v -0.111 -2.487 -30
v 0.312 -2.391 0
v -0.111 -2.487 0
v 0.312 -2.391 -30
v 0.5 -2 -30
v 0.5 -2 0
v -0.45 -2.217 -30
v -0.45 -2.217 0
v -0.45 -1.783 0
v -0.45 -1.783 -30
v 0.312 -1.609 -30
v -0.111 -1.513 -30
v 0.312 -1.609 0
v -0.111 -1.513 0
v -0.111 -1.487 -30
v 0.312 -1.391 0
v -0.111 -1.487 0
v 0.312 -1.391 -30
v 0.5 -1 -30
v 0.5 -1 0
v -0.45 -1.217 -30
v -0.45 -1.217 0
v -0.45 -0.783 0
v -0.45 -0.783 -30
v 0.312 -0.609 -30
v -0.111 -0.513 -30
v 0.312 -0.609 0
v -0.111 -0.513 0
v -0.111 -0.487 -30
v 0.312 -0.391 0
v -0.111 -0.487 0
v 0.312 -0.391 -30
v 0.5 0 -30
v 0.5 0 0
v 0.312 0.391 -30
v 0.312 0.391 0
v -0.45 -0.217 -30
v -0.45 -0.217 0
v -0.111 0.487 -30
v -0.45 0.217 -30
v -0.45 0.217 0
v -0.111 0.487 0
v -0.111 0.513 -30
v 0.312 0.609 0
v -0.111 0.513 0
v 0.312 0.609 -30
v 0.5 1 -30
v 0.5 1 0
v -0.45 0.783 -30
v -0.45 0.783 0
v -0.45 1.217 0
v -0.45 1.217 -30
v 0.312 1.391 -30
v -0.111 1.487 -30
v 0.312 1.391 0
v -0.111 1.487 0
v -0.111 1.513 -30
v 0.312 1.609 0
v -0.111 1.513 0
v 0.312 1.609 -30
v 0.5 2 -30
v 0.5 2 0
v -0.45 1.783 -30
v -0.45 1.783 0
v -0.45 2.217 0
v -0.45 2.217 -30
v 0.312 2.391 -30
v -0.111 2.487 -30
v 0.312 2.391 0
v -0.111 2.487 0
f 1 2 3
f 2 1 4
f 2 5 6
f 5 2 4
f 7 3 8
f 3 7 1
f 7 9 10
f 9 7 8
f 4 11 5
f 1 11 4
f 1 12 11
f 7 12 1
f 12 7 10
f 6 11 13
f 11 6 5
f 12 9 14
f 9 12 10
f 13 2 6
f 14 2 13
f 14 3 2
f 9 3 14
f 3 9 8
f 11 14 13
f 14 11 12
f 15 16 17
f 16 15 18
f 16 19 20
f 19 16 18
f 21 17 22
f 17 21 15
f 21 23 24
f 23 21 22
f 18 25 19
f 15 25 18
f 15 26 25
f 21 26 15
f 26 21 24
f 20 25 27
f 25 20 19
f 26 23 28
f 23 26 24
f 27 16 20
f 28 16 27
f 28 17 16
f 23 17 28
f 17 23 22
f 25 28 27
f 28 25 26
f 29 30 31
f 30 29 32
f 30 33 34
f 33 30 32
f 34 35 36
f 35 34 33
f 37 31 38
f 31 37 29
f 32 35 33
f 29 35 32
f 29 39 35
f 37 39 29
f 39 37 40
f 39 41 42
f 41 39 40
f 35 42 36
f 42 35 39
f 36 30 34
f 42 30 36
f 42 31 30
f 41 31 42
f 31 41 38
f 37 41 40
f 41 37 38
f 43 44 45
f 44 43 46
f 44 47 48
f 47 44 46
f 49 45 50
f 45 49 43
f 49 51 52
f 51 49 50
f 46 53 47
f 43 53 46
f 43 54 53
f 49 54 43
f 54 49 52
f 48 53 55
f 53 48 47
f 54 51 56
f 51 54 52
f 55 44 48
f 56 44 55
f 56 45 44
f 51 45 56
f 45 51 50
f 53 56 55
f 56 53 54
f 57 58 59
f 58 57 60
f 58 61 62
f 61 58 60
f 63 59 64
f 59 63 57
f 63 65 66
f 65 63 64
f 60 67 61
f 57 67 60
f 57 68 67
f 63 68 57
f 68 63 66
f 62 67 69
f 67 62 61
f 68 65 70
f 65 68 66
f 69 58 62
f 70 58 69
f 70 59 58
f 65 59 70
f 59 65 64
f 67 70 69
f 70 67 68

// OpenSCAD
// 28BYJ-48 from RGriffoGoes 
// at http://www.thingiverse.com/thing:204734
// named and measured dimensions, and
// added details by J.Beale 21 July 2014

MBH = 18.8;   // motor body height
MBD = 28.25;  // motor body OD
SBD = 9.1;    // shaft boss OD
SBH = 1.45;   // shaft boss height above motor body
SBO = 7.875;  // offset of shaft/boss center from motor center
SHD = 4.93;   // motor shaft OD
SHDF = 3.0;   // motor shaft diameter, across flats
SHHF = 6.0;   // motor shaft flats height, or depth in from end
SHH = 9.75;   // height of shaft above motor body 

MBFH = 0.7;   // height of body edge flange protruding above surface
MBFW = 1.0;   // width of edge flange
MBFNW = 8;    // width of notch in edge flange
MBFNW2 = 17.8;  // width of edge flange notch above wiring box

MHCC = 35.0;  // mounting hole center-to-center
MTH  = 0.8;   // mounting tab thickness
MTW  = 7.0;   // mounting tab width
WBH  = 16.7;  // plastic wiring box height
WBW  = 14.6;  // plastic wiring box width
WBD  = 31.3;  // body diameter to outer surface of wiring box

WRD = 1.0;     // diameter of electrical wires
WRL = 30;      // length of electrical wires
WRO = 2.2;		// offset of wires below top motor surface

// =========================================================
eps = 0.05;   // small number to avoid coincident faces


module wires() {
 
  color([0.9,0.9,0]) translate([0,WRD*2,0]) cylinder(h=WRL,r=WRD/2, $fn = 7);
  color([.9,.45,0]) translate([0,WRD*1,0]) cylinder(h=WRL,r=WRD/2, $fn = 7);   
  color([1,0,0]) translate([0,0,0]) cylinder(h=WRL,r=WRD/2, $fn = 7);
  color([1,.6,.6]) translate([0,-WRD*1,0]) cylinder(h=WRL,r=WRD/2, $fn = 7);
  color([.2,.2,1]) translate([0,-WRD*2,0]) cylinder(h=WRL,r=WRD/2, $fn = 7);
}

module StepMotor28BYJ()
{
  difference(){
    union(){
	   color("gray") translate([0,0,-(MBH+MBFH)/2])
		  difference() {  // flange at top rim
         cylinder(h = MBFH+eps, r = MBD/2, center = true, $fn = 50);
         cylinder(h = MBFH+2*eps, r = (MBD-MBFW)/2, center = true, $fn = 32);
			cube([MBFNW,MHCC,MBFH*2],center=true); // notches in rim
			cube([MBD+2*MBFW,SBD,MBFH*2],center=true);
		   translate([-MBD/2,0,0]) cube([MBD,MBFNW2,MBFH*2],center=true);
        }
		color("gray") // motor body
			cylinder(h = MBH, r = MBD/2, center = true, $fn = 50);
		color("gray") translate([SBO,0,-SBH])	// shaft boss
			cylinder(h = MBH, r = SBD/2, center = true, $fn = 32);

		translate([SBO,0,-SHH])	// motor shaft
        difference() {
			color("gold") cylinder(h = MBH, r = SHD/2, center = true, $fn = 32);
				// shaft flats
		   color("red") translate([(SHD+SHDF)/2,0,-(eps+MBH-SHHF)/2]) 
				cube([SHD,SHD,SHHF], center = true);
		   color("red") translate([-(SHD+SHDF)/2,0,-(eps+MBH-SHHF)/2]) 
				cube([SHD,SHD,SHHF], center = true);
        }


		color("Silver") translate([0,0,-(MBH-MTH-eps)/2]) // mounting tab 
			cube([MTW,MHCC,MTH], center = true);				
		color("Silver") translate([0,MHCC/2,-(MBH-MTH)/2]) // mt.tab rounded end
			cylinder(h = MTH, r = MTW/2, center = true, $fn = 32);
		color("Silver") translate([0,-MHCC/2,-(MBH-MTH)/2]) // mt.tab rounded end
			cylinder(h = MTH, r = MTW/2, center = true, $fn = 32);


		color("blue") translate([-(WBD-MBD),0,eps-(MBH-WBH)/2]) // plastic wire box
			cube([MBD,WBW,WBH], center = true);
	   color("blue") translate([-2,0,0])	
			cube([24.5,16,15], center = true);
		}

				// mounting holes in tabs on side
		color("red") translate([0,MHCC/2,-MBH/2])	
				cylinder(h = 2, r = 2, center = true, $fn = 32);
		color("red") translate([0,-MHCC/2,-MBH/2])	
				cylinder(h = 2, r = 2, center = true, $fn = 32);
		}
	}

rotate([180,0,0]) {

  //StepMotor28BYJ();  // motor body (without wires)

  // 5 colored hookup wires
  //translate([0,0,-(MBH/2 - WRO)]) rotate([0,-90,0])  
	  wires();
}
